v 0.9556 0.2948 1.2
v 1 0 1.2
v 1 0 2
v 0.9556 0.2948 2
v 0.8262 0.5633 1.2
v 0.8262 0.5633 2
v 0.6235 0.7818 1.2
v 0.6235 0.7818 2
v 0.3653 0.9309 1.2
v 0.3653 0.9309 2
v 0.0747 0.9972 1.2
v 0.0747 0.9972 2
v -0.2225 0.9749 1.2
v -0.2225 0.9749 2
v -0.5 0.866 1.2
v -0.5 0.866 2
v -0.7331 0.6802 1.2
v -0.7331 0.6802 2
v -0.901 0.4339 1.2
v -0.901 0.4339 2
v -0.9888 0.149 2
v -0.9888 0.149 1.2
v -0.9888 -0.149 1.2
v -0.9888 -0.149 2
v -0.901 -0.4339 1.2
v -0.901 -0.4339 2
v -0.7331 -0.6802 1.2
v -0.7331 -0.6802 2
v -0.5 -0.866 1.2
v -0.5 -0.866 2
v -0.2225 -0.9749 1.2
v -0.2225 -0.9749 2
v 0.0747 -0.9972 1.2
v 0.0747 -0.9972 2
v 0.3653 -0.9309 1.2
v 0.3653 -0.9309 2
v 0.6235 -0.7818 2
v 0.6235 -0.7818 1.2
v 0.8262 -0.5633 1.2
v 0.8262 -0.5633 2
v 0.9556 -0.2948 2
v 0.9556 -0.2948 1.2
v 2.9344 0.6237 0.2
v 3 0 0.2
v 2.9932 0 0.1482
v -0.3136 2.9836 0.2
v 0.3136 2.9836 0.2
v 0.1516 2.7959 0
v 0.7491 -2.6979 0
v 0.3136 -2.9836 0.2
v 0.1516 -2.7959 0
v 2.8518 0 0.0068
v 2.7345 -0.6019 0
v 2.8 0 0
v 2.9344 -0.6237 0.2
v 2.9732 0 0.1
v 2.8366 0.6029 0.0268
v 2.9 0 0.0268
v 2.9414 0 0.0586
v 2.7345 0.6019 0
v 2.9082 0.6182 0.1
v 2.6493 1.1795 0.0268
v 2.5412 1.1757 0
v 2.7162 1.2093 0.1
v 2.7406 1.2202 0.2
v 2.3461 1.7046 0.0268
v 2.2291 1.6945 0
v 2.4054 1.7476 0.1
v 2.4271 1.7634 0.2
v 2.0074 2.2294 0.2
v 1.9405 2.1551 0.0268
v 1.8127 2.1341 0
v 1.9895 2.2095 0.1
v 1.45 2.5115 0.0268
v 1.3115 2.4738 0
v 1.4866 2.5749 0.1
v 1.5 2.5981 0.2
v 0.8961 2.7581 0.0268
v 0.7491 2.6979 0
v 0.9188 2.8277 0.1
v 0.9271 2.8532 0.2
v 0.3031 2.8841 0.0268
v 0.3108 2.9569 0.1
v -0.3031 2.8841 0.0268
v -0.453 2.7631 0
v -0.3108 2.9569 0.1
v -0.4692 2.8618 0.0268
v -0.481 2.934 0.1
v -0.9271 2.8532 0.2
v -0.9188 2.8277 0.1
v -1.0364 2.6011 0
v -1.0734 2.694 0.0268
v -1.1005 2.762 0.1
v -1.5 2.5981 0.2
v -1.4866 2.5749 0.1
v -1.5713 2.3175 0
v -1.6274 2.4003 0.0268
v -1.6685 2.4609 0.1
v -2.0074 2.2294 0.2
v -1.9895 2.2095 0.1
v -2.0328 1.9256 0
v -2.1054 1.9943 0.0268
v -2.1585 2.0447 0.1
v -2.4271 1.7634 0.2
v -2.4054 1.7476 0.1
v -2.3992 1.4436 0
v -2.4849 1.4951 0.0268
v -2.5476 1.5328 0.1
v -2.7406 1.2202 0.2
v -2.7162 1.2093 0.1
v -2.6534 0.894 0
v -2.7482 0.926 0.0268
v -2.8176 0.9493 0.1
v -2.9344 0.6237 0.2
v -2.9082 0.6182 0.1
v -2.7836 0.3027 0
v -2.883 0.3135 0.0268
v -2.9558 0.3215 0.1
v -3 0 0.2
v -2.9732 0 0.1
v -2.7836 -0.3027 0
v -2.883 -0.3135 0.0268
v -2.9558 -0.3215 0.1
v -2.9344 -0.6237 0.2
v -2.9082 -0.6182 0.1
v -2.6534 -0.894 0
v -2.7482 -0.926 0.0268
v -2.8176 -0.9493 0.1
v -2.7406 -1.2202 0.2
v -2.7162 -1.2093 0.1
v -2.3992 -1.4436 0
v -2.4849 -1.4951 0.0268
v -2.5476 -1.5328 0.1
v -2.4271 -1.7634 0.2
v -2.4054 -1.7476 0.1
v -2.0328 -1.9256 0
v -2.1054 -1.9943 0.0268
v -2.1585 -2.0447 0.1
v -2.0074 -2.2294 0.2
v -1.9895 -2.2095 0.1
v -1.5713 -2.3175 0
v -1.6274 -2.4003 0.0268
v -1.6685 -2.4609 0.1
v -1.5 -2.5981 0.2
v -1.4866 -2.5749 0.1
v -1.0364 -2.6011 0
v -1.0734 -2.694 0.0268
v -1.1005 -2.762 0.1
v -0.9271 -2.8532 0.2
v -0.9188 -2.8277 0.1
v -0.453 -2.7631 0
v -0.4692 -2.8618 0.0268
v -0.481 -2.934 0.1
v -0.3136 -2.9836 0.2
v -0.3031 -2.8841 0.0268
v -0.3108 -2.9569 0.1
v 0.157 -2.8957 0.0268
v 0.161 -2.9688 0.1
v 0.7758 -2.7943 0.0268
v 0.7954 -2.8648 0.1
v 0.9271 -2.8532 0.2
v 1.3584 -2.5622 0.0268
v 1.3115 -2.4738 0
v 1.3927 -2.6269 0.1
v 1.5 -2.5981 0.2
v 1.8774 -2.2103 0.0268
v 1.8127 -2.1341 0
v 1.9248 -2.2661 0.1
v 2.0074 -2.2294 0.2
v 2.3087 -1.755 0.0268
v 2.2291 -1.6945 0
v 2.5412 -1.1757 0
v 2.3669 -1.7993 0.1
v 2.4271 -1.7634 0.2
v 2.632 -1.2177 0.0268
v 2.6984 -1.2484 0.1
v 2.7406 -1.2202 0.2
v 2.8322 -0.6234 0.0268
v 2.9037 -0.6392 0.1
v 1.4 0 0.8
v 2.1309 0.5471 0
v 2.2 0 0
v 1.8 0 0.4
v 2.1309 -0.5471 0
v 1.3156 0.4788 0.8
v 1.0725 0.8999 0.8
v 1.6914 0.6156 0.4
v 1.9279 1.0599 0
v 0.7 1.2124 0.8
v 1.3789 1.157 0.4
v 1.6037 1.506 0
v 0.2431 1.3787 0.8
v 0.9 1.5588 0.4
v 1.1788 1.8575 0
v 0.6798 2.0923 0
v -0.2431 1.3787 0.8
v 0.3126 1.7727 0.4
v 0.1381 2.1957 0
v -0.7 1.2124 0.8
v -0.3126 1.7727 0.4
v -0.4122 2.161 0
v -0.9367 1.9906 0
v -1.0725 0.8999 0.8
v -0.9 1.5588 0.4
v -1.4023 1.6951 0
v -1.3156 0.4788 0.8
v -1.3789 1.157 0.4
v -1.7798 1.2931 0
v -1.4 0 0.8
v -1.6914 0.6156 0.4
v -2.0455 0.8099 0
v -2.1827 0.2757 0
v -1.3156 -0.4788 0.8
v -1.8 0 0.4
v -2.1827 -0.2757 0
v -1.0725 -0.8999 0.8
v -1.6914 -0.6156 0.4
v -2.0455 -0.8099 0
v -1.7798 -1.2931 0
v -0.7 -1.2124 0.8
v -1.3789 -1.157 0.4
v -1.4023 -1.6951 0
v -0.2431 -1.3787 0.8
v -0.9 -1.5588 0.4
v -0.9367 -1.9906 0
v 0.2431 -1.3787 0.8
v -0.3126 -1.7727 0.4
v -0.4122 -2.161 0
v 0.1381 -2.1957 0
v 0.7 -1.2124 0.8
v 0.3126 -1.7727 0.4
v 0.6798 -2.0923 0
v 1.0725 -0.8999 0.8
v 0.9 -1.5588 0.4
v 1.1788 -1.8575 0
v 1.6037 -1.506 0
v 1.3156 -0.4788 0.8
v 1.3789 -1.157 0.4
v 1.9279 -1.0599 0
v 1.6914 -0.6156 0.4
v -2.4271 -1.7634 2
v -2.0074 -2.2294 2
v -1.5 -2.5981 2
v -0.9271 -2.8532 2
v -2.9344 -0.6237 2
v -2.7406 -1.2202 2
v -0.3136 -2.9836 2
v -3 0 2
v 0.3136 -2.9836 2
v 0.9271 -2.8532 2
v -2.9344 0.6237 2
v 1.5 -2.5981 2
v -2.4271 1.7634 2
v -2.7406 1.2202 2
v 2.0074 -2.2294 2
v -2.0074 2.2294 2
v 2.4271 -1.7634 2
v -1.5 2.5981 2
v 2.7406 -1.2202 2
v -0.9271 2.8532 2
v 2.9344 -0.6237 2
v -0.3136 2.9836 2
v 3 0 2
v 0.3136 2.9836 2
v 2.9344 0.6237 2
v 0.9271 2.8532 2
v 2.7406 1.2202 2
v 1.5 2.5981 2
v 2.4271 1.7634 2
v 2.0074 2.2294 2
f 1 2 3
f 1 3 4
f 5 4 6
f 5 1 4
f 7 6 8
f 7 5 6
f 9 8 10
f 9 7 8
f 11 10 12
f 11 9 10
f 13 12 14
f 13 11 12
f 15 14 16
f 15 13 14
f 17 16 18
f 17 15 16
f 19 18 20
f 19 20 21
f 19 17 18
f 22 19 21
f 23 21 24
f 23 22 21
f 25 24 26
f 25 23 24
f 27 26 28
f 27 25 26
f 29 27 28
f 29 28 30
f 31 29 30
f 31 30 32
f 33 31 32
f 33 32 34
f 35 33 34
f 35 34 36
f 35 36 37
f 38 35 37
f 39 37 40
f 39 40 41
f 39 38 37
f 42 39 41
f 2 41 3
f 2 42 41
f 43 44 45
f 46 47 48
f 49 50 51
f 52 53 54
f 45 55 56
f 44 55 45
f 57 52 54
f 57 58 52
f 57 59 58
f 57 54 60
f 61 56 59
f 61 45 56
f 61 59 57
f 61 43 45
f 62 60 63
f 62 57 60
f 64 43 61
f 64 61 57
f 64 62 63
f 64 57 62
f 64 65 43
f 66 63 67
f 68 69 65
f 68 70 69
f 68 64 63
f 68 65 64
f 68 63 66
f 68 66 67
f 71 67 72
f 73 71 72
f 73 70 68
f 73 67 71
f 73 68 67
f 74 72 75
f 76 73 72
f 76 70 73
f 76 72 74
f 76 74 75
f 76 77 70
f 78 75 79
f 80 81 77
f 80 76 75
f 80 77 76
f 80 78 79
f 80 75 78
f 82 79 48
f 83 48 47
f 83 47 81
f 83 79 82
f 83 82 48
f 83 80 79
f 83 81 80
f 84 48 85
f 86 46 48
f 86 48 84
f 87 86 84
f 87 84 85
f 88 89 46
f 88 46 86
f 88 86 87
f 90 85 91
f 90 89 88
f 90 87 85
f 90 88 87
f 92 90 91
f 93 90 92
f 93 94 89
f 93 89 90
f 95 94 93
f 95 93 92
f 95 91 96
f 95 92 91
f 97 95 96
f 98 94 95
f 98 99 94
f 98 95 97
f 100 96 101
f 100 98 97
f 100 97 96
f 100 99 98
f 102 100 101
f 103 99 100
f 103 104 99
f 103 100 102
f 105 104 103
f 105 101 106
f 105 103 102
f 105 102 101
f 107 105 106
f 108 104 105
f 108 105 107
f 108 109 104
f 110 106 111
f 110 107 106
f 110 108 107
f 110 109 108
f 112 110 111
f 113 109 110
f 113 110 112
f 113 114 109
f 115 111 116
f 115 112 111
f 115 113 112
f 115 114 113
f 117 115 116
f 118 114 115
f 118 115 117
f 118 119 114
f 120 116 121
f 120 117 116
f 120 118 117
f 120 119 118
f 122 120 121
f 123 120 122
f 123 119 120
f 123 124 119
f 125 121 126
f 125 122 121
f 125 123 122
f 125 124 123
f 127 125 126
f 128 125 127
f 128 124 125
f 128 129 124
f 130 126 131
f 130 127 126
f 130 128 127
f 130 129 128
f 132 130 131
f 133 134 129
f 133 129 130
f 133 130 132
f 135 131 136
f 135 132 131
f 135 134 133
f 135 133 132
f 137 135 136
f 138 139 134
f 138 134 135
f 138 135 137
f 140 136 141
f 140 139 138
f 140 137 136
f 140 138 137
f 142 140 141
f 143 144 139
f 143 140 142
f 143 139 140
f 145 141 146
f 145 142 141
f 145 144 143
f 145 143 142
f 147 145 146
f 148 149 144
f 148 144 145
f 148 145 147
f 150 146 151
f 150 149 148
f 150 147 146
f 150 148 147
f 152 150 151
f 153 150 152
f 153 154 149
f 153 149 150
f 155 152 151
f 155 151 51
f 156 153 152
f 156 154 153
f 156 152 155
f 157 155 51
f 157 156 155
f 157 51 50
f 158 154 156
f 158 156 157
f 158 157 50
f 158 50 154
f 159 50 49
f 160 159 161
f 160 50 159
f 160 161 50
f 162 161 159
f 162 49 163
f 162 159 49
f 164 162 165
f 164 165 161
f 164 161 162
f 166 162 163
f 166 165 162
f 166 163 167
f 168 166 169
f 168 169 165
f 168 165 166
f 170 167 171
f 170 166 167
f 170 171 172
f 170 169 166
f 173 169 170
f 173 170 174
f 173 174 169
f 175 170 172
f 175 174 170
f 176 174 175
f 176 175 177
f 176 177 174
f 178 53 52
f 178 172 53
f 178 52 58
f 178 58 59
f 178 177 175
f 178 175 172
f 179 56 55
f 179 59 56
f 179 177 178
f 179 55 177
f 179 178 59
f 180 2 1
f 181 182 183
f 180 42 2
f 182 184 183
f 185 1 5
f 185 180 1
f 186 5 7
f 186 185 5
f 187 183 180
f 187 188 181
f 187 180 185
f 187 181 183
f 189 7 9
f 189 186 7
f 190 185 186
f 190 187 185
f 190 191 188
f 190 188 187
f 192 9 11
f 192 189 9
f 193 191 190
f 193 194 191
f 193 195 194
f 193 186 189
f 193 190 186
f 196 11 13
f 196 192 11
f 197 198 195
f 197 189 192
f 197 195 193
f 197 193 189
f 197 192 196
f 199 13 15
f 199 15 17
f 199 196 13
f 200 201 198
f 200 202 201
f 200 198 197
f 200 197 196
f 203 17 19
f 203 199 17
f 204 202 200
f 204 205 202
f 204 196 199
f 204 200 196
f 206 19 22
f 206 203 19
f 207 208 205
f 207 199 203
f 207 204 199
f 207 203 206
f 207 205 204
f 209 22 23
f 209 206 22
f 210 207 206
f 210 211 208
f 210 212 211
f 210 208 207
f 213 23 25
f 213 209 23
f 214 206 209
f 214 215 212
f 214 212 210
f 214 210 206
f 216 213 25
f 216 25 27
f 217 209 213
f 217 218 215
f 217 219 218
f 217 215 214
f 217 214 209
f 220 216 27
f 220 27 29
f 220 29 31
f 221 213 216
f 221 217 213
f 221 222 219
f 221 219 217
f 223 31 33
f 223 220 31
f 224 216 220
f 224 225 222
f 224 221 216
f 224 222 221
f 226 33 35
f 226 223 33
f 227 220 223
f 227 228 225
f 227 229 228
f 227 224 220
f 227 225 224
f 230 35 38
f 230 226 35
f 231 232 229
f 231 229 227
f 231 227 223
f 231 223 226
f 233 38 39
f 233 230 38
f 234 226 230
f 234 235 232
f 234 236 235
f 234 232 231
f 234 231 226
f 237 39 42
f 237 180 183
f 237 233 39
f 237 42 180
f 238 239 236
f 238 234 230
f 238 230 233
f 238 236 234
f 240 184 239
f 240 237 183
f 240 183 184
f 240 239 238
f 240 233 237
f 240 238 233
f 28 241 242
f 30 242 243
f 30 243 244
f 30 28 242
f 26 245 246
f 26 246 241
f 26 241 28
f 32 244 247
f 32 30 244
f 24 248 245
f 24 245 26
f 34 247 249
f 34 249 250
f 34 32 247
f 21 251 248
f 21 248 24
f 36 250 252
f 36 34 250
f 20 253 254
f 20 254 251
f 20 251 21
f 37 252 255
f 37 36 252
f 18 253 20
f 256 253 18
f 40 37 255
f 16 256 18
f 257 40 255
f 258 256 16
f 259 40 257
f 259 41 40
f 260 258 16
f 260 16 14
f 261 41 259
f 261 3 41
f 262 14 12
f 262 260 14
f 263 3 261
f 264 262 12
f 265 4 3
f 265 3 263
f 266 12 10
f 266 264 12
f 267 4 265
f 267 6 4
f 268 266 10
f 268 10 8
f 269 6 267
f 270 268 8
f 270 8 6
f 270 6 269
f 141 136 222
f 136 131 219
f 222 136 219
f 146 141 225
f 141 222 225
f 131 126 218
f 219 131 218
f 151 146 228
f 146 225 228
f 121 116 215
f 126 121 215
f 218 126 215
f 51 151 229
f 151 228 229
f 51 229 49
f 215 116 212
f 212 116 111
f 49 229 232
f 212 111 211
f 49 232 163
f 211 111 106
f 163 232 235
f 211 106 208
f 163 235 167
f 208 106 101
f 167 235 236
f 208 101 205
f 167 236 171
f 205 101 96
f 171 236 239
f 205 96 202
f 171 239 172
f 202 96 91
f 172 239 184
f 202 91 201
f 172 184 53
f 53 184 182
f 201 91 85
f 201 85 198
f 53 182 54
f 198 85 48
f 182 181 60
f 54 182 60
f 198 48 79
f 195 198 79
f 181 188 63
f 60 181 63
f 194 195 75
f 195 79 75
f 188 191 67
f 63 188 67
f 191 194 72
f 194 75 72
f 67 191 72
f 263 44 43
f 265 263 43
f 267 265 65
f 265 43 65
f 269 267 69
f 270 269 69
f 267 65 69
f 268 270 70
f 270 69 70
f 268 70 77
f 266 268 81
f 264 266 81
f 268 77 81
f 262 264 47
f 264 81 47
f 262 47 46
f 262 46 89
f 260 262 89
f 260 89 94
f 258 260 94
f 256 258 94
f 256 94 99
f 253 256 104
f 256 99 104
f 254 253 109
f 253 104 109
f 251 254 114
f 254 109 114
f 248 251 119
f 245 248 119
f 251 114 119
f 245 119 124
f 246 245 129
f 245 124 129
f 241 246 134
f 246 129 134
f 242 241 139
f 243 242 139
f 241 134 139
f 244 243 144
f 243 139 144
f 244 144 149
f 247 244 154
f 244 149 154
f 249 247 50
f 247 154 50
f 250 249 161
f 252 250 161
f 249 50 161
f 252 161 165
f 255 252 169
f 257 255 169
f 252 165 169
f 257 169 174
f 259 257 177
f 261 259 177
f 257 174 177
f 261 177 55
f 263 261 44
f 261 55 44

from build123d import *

# Parameters (mm, degrees)
SKETCH_1_R      = 3
SKETCH_1_R_2    = 1
EXTRUDE_1_DEPTH = 2
CHAMFER_1_SIZE  = 1.2
FILLET_1_R      = 0.2


with BuildPart() as part:
    # 草图1 → 凸台-拉伸1 (new body)
    with BuildSketch(Plane.XY):
        Circle(SKETCH_1_R)
        Circle(SKETCH_1_R_2, mode=Mode.SUBTRACT)
    extrude(amount=EXTRUDE_1_DEPTH)

    # 倒角1
    chamfer_1_edges = [part.edges().sort_by_distance(p)[0] for p in [
        (-1, 0, 0),
    ]]
    chamfer(chamfer_1_edges, length=CHAMFER_1_SIZE)

    # 圆角1
    fillet_1_edges = [part.edges().sort_by_distance(p)[0] for p in [
        (-3, 0, 0),
    ]]
    fillet(fillet_1_edges, radius=FILLET_1_R)


solid = part.part
